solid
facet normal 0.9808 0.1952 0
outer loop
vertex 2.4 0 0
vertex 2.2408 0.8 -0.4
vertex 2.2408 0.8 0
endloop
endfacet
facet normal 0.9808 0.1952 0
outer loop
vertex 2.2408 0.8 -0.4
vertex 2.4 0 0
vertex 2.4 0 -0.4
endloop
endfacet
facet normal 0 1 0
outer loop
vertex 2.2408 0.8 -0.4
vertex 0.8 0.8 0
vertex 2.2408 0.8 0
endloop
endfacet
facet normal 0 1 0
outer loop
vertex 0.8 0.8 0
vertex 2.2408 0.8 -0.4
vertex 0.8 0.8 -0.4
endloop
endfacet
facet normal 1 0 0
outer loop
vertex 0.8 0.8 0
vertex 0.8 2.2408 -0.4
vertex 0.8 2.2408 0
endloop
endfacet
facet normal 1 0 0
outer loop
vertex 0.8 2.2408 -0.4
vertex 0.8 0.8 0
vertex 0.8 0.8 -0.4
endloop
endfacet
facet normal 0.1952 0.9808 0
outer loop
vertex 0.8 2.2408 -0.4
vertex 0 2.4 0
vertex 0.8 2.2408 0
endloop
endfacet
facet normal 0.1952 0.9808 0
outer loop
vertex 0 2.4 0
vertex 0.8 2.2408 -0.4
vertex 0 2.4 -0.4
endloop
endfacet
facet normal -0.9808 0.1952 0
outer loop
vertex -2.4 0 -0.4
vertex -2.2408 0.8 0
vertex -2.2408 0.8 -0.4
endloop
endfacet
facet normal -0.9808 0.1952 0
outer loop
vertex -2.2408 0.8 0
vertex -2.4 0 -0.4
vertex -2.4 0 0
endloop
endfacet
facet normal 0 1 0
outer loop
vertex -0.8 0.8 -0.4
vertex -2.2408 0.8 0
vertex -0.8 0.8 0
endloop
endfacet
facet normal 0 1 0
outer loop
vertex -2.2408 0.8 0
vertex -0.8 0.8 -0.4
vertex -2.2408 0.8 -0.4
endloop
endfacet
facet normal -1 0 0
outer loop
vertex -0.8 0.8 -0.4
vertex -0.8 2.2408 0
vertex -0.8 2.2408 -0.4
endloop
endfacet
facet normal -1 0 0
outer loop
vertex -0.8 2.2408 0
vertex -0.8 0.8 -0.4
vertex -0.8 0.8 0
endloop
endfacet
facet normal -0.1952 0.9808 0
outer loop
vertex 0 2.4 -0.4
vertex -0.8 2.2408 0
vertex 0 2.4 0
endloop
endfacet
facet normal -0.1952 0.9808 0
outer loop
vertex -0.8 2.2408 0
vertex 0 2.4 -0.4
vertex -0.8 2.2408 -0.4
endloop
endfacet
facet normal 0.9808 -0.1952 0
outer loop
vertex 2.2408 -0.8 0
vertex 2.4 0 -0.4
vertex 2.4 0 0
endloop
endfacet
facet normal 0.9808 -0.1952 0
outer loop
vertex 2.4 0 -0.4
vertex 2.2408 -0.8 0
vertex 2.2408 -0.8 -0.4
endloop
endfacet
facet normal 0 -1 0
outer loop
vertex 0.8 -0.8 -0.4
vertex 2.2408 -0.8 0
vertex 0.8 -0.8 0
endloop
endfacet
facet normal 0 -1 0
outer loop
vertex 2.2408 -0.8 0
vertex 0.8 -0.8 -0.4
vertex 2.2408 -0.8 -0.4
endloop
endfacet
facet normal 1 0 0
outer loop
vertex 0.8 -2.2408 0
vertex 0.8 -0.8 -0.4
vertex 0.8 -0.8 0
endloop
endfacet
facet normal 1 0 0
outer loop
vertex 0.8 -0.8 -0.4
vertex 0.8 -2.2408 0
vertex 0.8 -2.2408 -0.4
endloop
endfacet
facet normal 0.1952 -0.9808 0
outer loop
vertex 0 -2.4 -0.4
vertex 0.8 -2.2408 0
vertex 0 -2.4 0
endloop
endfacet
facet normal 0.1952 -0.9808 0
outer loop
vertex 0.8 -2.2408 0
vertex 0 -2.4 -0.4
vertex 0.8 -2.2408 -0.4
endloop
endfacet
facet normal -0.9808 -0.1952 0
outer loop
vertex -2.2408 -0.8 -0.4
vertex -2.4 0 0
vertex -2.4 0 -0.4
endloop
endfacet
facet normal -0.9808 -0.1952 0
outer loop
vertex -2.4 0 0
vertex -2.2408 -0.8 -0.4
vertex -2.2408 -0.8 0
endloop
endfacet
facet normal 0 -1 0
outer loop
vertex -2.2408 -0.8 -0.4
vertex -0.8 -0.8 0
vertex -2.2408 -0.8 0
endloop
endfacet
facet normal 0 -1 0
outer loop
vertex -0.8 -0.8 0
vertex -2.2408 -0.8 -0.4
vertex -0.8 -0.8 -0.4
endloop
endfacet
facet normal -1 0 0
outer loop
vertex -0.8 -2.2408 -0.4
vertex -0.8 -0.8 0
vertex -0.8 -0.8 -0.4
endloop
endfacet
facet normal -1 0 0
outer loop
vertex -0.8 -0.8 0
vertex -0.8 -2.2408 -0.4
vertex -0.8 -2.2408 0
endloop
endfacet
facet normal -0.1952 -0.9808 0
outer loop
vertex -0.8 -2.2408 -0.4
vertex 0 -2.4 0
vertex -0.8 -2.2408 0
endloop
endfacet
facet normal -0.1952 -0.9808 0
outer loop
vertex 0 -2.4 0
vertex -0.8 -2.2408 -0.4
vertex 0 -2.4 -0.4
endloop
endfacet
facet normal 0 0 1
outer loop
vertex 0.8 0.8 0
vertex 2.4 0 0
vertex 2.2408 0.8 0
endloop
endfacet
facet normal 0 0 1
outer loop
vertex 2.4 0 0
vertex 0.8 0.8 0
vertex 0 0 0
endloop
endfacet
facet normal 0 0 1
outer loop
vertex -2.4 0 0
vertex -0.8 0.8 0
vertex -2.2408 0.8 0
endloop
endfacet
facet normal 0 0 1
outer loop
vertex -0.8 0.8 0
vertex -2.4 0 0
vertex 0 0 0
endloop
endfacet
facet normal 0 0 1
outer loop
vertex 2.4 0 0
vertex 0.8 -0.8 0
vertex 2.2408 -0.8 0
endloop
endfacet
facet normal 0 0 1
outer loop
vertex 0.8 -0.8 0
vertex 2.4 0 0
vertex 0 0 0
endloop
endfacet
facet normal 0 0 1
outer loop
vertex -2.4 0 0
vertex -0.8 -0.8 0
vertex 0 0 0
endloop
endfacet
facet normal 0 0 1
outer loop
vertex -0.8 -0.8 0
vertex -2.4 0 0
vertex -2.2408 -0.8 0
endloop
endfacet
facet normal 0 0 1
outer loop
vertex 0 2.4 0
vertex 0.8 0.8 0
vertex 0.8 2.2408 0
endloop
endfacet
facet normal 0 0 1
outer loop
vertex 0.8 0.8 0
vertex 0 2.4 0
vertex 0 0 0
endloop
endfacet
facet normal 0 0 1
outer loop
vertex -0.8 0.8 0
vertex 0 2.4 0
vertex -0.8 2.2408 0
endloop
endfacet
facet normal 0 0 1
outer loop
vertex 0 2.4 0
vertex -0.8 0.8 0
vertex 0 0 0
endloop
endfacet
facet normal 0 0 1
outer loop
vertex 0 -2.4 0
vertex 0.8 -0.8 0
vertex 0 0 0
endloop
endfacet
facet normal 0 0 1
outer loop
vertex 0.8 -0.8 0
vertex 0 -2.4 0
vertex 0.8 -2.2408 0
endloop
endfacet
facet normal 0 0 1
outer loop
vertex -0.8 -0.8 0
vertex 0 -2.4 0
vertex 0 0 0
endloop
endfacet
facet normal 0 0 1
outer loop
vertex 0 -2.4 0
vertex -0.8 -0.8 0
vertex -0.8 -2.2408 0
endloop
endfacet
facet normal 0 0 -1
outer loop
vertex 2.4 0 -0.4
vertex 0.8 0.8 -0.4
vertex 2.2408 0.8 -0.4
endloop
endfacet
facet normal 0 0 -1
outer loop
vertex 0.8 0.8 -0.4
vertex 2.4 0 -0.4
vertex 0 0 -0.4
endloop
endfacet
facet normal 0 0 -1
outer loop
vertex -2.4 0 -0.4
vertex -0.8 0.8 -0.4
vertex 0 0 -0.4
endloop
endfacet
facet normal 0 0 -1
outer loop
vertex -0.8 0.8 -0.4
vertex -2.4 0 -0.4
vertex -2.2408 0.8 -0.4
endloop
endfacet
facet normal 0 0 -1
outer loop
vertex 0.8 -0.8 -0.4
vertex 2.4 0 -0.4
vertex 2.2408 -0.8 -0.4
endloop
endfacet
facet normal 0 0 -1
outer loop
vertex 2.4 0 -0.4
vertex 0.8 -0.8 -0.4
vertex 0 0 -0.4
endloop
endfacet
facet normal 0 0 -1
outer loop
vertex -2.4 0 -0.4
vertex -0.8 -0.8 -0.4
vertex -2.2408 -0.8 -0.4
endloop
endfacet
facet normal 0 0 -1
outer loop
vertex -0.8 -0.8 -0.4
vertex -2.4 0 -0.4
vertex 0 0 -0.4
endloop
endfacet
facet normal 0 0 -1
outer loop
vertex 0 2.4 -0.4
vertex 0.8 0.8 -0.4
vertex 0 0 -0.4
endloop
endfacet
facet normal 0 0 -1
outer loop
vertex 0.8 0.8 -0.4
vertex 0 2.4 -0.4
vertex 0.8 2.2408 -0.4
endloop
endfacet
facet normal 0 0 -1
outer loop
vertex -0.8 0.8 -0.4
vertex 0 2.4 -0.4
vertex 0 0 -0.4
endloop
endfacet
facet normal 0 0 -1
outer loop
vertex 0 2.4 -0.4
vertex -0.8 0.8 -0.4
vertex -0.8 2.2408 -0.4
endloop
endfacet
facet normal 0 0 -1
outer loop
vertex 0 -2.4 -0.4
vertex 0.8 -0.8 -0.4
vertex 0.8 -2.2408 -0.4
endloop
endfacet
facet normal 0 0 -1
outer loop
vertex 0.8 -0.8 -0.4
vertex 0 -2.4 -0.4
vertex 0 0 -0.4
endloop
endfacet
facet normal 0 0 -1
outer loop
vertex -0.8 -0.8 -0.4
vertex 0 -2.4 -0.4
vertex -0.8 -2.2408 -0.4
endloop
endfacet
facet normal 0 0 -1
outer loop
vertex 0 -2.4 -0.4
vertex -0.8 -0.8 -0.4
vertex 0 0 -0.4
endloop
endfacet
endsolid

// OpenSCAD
use <../lib.scad>
function ldraw_lib__axle() = [
// 0 Axle
// 0 Name: axle.dat
// 0 Author: James Jessiman
// 0 !LDRAW_ORG Primitive UPDATE 2003-01
// 0 !LICENSE Licensed under CC BY 4.0 : see CAreadme.txt
// 
// 0 BFC CERTIFY CCW
  [0,"BFC","CERTIFY"],
  [0,"BFC","CCW"],
// 
// 0 !HISTORY 2000-04-23 [sbliss] Added conditional edges along outermost diameters
// 0 !HISTORY 2000-05-07 [PTadmin] Official Update 2000-01
// 0 !HISTORY 2002-11-08 [OrionP] Adjusted fit and precision
// 0 !HISTORY 2003-03-12 [PTadmin] Official Update 2003-01
// 0 !HISTORY 2007-06-24 [PTadmin] Header formatted for Contributor Agreement
// 0 !HISTORY 2008-07-01 [PTadmin] Official Update 2008-01
// 
// 
// 5 24 6 0 0 6 1 0 5.602 0 2 5.602 0 -2
  [5,24,6,0,0,6,1,0,5.602,0,2,5.602,0,-2],
// 5 24 0 0 6 0 1 6 2 0 5.602 -2 0 5.602
  [5,24,0,0,6,0,1,6,2,0,5.602,-2,0,5.602],
// 5 24 -6 0 0 -6 1 0 -5.602 0 -2 -5.602 0 2
  [5,24,-6,0,0,-6,1,0,-5.602,0,-2,-5.602,0,2],
// 5 24 0 0 -6 0 1 -6 -2 0 -5.602 2 0 -5.602
  [5,24,0,0,-6,0,1,-6,-2,0,-5.602,2,0,-5.602],
// 
// 2 24 6 0 0 5.602 0 2
  [2,24,6,0,0,5.602,0,2],
// 2 24 5.602 0 2 2 0 2
  [2,24,5.602,0,2,2,0,2],
// 2 24 2 0 2 2 0 5.602
  [2,24,2,0,2,2,0,5.602],
// 2 24 2 0 5.602 0 0 6
  [2,24,2,0,5.602,0,0,6],
// 2 24 -6 0 0 -5.602 0 2
  [2,24,-6,0,0,-5.602,0,2],
// 2 24 -5.602 0 2 -2 0 2
  [2,24,-5.602,0,2,-2,0,2],
// 2 24 -2 0 2 -2 0 5.602
  [2,24,-2,0,2,-2,0,5.602],
// 2 24 -2 0 5.602 -0 0 6
  [2,24,-2,0,5.602,-0,0,6],
// 2 24 6 0 -0 5.602 0 -2
  [2,24,6,0,-0,5.602,0,-2],
// 2 24 5.602 0 -2 2 0 -2
  [2,24,5.602,0,-2,2,0,-2],
// 2 24 2 0 -2 2 0 -5.602
  [2,24,2,0,-2,2,0,-5.602],
// 2 24 2 0 -5.602 0 0 -6
  [2,24,2,0,-5.602,0,0,-6],
// 2 24 -6 0 -0 -5.602 0 -2
  [2,24,-6,0,-0,-5.602,0,-2],
// 2 24 -5.602 0 -2 -2 0 -2
  [2,24,-5.602,0,-2,-2,0,-2],
// 2 24 -2 0 -2 -2 0 -5.602
  [2,24,-2,0,-2,-2,0,-5.602],
// 2 24 -2 0 -5.602 -0 0 -6
  [2,24,-2,0,-5.602,-0,0,-6],
// 2 24 6 1 0 5.602 1 2
  [2,24,6,1,0,5.602,1,2],
// 2 24 5.602 1 2 2 1 2
  [2,24,5.602,1,2,2,1,2],
// 2 24 2 1 2 2 1 5.602
  [2,24,2,1,2,2,1,5.602],
// 2 24 2 1 5.602 0 1 6
  [2,24,2,1,5.602,0,1,6],
// 2 24 -6 1 0 -5.602 1 2
  [2,24,-6,1,0,-5.602,1,2],
// 2 24 -5.602 1 2 -2 1 2
  [2,24,-5.602,1,2,-2,1,2],
// 2 24 -2 1 2 -2 1 5.602
  [2,24,-2,1,2,-2,1,5.602],
// 2 24 -2 1 5.602 -0 1 6
  [2,24,-2,1,5.602,-0,1,6],
// 2 24 6 1 -0 5.602 1 -2
  [2,24,6,1,-0,5.602,1,-2],
// 2 24 5.602 1 -2 2 1 -2
  [2,24,5.602,1,-2,2,1,-2],
// 2 24 2 1 -2 2 1 -5.602
  [2,24,2,1,-2,2,1,-5.602],
// 2 24 2 1 -5.602 0 1 -6
  [2,24,2,1,-5.602,0,1,-6],
// 2 24 -6 1 -0 -5.602 1 -2
  [2,24,-6,1,-0,-5.602,1,-2],
// 2 24 -5.602 1 -2 -2 1 -2
  [2,24,-5.602,1,-2,-2,1,-2],
// 2 24 -2 1 -2 -2 1 -5.602
  [2,24,-2,1,-2,-2,1,-5.602],
// 2 24 -2 1 -5.602 -0 1 -6
  [2,24,-2,1,-5.602,-0,1,-6],
// 
// 2 24 5.602 0 2 5.602 1 2
  [2,24,5.602,0,2,5.602,1,2],
// 2 24 2 0 2 2 1 2
  [2,24,2,0,2,2,1,2],
// 2 24 2 0 5.602 2 1 5.602
  [2,24,2,0,5.602,2,1,5.602],
// 2 24 -5.602 0 2 -5.602 1 2
  [2,24,-5.602,0,2,-5.602,1,2],
// 2 24 -2 0 2 -2 1 2
  [2,24,-2,0,2,-2,1,2],
// 2 24 -2 0 5.602 -2 1 5.602
  [2,24,-2,0,5.602,-2,1,5.602],
// 2 24 5.602 0 -2 5.602 1 -2
  [2,24,5.602,0,-2,5.602,1,-2],
// 2 24 2 0 -2 2 1 -2
  [2,24,2,0,-2,2,1,-2],
// 2 24 2 0 -5.602 2 1 -5.602
  [2,24,2,0,-5.602,2,1,-5.602],
// 2 24 -5.602 0 -2 -5.602 1 -2
  [2,24,-5.602,0,-2,-5.602,1,-2],
// 2 24 -2 0 -2 -2 1 -2
  [2,24,-2,0,-2,-2,1,-2],
// 2 24 -2 0 -5.602 -2 1 -5.602
  [2,24,-2,0,-5.602,-2,1,-5.602],
// 
// 4 16 6 0 0 6 1 0 5.602 1 2 5.602 0 2
  [4,16,6,0,0,6,1,0,5.602,1,2,5.602,0,2],
// 4 16 5.602 0 2 5.602 1 2 2 1 2 2 0 2
  [4,16,5.602,0,2,5.602,1,2,2,1,2,2,0,2],
// 4 16 2 0 2 2 1 2 2 1 5.602 2 0 5.602
  [4,16,2,0,2,2,1,2,2,1,5.602,2,0,5.602],
// 4 16 2 0 5.602 2 1 5.602 0 1 6 0 0 6
  [4,16,2,0,5.602,2,1,5.602,0,1,6,0,0,6],
// 4 16 -6 0 0 -5.602 0 2 -5.602 1 2 -6 1 0
  [4,16,-6,0,0,-5.602,0,2,-5.602,1,2,-6,1,0],
// 4 16 -5.602 0 2 -2 0 2 -2 1 2 -5.602 1 2
  [4,16,-5.602,0,2,-2,0,2,-2,1,2,-5.602,1,2],
// 4 16 -2 0 2 -2 0 5.602 -2 1 5.602 -2 1 2
  [4,16,-2,0,2,-2,0,5.602,-2,1,5.602,-2,1,2],
// 4 16 -2 0 5.602 -0 0 6 -0 1 6 -2 1 5.602
  [4,16,-2,0,5.602,-0,0,6,-0,1,6,-2,1,5.602],
// 4 16 6 0 -0 5.602 0 -2 5.602 1 -2 6 1 -0
  [4,16,6,0,-0,5.602,0,-2,5.602,1,-2,6,1,-0],
// 4 16 5.602 0 -2 2 0 -2 2 1 -2 5.602 1 -2
  [4,16,5.602,0,-2,2,0,-2,2,1,-2,5.602,1,-2],
// 4 16 2 0 -2 2 0 -5.602 2 1 -5.602 2 1 -2
  [4,16,2,0,-2,2,0,-5.602,2,1,-5.602,2,1,-2],
// 4 16 2 0 -5.602 0 0 -6 0 1 -6 2 1 -5.602
  [4,16,2,0,-5.602,0,0,-6,0,1,-6,2,1,-5.602],
// 4 16 -6 0 -0 -6 1 -0 -5.602 1 -2 -5.602 0 -2
  [4,16,-6,0,-0,-6,1,-0,-5.602,1,-2,-5.602,0,-2],
// 4 16 -5.602 0 -2 -5.602 1 -2 -2 1 -2 -2 0 -2
  [4,16,-5.602,0,-2,-5.602,1,-2,-2,1,-2,-2,0,-2],
// 4 16 -2 0 -2 -2 1 -2 -2 1 -5.602 -2 0 -5.602
  [4,16,-2,0,-2,-2,1,-2,-2,1,-5.602,-2,0,-5.602],
// 4 16 -2 0 -5.602 -2 1 -5.602 -0 1 -6 -0 0 -6
  [4,16,-2,0,-5.602,-2,1,-5.602,-0,1,-6,-0,0,-6],
// 
// 4 16 6 0 0 5.602 0 2 2 0 2 0 0 0
  [4,16,6,0,0,5.602,0,2,2,0,2,0,0,0],
// 4 16 -6 0 0 0 0 0 -2 0 2 -5.602 0 2
  [4,16,-6,0,0,0,0,0,-2,0,2,-5.602,0,2],
// 4 16 6 0 0 0 0 0 2 0 -2 5.602 0 -2
  [4,16,6,0,0,0,0,0,2,0,-2,5.602,0,-2],
// 4 16 -6 0 0 -5.602 0 -2 -2 0 -2 0 0 0
  [4,16,-6,0,0,-5.602,0,-2,-2,0,-2,0,0,0],
// 4 16 0 0 6 0 0 0 2 0 2 2 0 5.602
  [4,16,0,0,6,0,0,0,2,0,2,2,0,5.602],
// 4 16 0 0 6 -2 0 5.602 -2 0 2 0 0 0
  [4,16,0,0,6,-2,0,5.602,-2,0,2,0,0,0],
// 4 16 0 0 -6 2 0 -5.602 2 0 -2 0 0 0
  [4,16,0,0,-6,2,0,-5.602,2,0,-2,0,0,0],
// 4 16 0 0 -6 0 0 0 -2 0 -2 -2 0 -5.602
  [4,16,0,0,-6,0,0,0,-2,0,-2,-2,0,-5.602],
// 4 16 6 1 0 0 1 0 2 1 2 5.602 1 2
  [4,16,6,1,0,0,1,0,2,1,2,5.602,1,2],
// 4 16 -6 1 0 -5.602 1 2 -2 1 2 0 1 0
  [4,16,-6,1,0,-5.602,1,2,-2,1,2,0,1,0],
// 4 16 6 1 0 5.602 1 -2 2 1 -2 0 1 0
  [4,16,6,1,0,5.602,1,-2,2,1,-2,0,1,0],
// 4 16 -6 1 0 0 1 0 -2 1 -2 -5.602 1 -2
  [4,16,-6,1,0,0,1,0,-2,1,-2,-5.602,1,-2],
// 4 16 0 1 6 2 1 5.602 2 1 2 0 1 0
  [4,16,0,1,6,2,1,5.602,2,1,2,0,1,0],
// 4 16 0 1 6 0 1 0 -2 1 2 -2 1 5.602
  [4,16,0,1,6,0,1,0,-2,1,2,-2,1,5.602],
// 4 16 0 1 -6 0 1 0 2 1 -2 2 1 -5.602
  [4,16,0,1,-6,0,1,0,2,1,-2,2,1,-5.602],
// 4 16 0 1 -6 -2 1 -5.602 -2 1 -2 0 1 0
  [4,16,0,1,-6,-2,1,-5.602,-2,1,-2,0,1,0],
// 0
];
module ldraw_lib__axle(step=0, col=false, unit=2/5, alt=false, line=0.2, solid=!$preview)
    makepoly(ldraw_lib__axle(), step=step, col=col, unit=unit, alt=alt, line=line, solid=solid);
ldraw_lib__axle(line=0.2);
